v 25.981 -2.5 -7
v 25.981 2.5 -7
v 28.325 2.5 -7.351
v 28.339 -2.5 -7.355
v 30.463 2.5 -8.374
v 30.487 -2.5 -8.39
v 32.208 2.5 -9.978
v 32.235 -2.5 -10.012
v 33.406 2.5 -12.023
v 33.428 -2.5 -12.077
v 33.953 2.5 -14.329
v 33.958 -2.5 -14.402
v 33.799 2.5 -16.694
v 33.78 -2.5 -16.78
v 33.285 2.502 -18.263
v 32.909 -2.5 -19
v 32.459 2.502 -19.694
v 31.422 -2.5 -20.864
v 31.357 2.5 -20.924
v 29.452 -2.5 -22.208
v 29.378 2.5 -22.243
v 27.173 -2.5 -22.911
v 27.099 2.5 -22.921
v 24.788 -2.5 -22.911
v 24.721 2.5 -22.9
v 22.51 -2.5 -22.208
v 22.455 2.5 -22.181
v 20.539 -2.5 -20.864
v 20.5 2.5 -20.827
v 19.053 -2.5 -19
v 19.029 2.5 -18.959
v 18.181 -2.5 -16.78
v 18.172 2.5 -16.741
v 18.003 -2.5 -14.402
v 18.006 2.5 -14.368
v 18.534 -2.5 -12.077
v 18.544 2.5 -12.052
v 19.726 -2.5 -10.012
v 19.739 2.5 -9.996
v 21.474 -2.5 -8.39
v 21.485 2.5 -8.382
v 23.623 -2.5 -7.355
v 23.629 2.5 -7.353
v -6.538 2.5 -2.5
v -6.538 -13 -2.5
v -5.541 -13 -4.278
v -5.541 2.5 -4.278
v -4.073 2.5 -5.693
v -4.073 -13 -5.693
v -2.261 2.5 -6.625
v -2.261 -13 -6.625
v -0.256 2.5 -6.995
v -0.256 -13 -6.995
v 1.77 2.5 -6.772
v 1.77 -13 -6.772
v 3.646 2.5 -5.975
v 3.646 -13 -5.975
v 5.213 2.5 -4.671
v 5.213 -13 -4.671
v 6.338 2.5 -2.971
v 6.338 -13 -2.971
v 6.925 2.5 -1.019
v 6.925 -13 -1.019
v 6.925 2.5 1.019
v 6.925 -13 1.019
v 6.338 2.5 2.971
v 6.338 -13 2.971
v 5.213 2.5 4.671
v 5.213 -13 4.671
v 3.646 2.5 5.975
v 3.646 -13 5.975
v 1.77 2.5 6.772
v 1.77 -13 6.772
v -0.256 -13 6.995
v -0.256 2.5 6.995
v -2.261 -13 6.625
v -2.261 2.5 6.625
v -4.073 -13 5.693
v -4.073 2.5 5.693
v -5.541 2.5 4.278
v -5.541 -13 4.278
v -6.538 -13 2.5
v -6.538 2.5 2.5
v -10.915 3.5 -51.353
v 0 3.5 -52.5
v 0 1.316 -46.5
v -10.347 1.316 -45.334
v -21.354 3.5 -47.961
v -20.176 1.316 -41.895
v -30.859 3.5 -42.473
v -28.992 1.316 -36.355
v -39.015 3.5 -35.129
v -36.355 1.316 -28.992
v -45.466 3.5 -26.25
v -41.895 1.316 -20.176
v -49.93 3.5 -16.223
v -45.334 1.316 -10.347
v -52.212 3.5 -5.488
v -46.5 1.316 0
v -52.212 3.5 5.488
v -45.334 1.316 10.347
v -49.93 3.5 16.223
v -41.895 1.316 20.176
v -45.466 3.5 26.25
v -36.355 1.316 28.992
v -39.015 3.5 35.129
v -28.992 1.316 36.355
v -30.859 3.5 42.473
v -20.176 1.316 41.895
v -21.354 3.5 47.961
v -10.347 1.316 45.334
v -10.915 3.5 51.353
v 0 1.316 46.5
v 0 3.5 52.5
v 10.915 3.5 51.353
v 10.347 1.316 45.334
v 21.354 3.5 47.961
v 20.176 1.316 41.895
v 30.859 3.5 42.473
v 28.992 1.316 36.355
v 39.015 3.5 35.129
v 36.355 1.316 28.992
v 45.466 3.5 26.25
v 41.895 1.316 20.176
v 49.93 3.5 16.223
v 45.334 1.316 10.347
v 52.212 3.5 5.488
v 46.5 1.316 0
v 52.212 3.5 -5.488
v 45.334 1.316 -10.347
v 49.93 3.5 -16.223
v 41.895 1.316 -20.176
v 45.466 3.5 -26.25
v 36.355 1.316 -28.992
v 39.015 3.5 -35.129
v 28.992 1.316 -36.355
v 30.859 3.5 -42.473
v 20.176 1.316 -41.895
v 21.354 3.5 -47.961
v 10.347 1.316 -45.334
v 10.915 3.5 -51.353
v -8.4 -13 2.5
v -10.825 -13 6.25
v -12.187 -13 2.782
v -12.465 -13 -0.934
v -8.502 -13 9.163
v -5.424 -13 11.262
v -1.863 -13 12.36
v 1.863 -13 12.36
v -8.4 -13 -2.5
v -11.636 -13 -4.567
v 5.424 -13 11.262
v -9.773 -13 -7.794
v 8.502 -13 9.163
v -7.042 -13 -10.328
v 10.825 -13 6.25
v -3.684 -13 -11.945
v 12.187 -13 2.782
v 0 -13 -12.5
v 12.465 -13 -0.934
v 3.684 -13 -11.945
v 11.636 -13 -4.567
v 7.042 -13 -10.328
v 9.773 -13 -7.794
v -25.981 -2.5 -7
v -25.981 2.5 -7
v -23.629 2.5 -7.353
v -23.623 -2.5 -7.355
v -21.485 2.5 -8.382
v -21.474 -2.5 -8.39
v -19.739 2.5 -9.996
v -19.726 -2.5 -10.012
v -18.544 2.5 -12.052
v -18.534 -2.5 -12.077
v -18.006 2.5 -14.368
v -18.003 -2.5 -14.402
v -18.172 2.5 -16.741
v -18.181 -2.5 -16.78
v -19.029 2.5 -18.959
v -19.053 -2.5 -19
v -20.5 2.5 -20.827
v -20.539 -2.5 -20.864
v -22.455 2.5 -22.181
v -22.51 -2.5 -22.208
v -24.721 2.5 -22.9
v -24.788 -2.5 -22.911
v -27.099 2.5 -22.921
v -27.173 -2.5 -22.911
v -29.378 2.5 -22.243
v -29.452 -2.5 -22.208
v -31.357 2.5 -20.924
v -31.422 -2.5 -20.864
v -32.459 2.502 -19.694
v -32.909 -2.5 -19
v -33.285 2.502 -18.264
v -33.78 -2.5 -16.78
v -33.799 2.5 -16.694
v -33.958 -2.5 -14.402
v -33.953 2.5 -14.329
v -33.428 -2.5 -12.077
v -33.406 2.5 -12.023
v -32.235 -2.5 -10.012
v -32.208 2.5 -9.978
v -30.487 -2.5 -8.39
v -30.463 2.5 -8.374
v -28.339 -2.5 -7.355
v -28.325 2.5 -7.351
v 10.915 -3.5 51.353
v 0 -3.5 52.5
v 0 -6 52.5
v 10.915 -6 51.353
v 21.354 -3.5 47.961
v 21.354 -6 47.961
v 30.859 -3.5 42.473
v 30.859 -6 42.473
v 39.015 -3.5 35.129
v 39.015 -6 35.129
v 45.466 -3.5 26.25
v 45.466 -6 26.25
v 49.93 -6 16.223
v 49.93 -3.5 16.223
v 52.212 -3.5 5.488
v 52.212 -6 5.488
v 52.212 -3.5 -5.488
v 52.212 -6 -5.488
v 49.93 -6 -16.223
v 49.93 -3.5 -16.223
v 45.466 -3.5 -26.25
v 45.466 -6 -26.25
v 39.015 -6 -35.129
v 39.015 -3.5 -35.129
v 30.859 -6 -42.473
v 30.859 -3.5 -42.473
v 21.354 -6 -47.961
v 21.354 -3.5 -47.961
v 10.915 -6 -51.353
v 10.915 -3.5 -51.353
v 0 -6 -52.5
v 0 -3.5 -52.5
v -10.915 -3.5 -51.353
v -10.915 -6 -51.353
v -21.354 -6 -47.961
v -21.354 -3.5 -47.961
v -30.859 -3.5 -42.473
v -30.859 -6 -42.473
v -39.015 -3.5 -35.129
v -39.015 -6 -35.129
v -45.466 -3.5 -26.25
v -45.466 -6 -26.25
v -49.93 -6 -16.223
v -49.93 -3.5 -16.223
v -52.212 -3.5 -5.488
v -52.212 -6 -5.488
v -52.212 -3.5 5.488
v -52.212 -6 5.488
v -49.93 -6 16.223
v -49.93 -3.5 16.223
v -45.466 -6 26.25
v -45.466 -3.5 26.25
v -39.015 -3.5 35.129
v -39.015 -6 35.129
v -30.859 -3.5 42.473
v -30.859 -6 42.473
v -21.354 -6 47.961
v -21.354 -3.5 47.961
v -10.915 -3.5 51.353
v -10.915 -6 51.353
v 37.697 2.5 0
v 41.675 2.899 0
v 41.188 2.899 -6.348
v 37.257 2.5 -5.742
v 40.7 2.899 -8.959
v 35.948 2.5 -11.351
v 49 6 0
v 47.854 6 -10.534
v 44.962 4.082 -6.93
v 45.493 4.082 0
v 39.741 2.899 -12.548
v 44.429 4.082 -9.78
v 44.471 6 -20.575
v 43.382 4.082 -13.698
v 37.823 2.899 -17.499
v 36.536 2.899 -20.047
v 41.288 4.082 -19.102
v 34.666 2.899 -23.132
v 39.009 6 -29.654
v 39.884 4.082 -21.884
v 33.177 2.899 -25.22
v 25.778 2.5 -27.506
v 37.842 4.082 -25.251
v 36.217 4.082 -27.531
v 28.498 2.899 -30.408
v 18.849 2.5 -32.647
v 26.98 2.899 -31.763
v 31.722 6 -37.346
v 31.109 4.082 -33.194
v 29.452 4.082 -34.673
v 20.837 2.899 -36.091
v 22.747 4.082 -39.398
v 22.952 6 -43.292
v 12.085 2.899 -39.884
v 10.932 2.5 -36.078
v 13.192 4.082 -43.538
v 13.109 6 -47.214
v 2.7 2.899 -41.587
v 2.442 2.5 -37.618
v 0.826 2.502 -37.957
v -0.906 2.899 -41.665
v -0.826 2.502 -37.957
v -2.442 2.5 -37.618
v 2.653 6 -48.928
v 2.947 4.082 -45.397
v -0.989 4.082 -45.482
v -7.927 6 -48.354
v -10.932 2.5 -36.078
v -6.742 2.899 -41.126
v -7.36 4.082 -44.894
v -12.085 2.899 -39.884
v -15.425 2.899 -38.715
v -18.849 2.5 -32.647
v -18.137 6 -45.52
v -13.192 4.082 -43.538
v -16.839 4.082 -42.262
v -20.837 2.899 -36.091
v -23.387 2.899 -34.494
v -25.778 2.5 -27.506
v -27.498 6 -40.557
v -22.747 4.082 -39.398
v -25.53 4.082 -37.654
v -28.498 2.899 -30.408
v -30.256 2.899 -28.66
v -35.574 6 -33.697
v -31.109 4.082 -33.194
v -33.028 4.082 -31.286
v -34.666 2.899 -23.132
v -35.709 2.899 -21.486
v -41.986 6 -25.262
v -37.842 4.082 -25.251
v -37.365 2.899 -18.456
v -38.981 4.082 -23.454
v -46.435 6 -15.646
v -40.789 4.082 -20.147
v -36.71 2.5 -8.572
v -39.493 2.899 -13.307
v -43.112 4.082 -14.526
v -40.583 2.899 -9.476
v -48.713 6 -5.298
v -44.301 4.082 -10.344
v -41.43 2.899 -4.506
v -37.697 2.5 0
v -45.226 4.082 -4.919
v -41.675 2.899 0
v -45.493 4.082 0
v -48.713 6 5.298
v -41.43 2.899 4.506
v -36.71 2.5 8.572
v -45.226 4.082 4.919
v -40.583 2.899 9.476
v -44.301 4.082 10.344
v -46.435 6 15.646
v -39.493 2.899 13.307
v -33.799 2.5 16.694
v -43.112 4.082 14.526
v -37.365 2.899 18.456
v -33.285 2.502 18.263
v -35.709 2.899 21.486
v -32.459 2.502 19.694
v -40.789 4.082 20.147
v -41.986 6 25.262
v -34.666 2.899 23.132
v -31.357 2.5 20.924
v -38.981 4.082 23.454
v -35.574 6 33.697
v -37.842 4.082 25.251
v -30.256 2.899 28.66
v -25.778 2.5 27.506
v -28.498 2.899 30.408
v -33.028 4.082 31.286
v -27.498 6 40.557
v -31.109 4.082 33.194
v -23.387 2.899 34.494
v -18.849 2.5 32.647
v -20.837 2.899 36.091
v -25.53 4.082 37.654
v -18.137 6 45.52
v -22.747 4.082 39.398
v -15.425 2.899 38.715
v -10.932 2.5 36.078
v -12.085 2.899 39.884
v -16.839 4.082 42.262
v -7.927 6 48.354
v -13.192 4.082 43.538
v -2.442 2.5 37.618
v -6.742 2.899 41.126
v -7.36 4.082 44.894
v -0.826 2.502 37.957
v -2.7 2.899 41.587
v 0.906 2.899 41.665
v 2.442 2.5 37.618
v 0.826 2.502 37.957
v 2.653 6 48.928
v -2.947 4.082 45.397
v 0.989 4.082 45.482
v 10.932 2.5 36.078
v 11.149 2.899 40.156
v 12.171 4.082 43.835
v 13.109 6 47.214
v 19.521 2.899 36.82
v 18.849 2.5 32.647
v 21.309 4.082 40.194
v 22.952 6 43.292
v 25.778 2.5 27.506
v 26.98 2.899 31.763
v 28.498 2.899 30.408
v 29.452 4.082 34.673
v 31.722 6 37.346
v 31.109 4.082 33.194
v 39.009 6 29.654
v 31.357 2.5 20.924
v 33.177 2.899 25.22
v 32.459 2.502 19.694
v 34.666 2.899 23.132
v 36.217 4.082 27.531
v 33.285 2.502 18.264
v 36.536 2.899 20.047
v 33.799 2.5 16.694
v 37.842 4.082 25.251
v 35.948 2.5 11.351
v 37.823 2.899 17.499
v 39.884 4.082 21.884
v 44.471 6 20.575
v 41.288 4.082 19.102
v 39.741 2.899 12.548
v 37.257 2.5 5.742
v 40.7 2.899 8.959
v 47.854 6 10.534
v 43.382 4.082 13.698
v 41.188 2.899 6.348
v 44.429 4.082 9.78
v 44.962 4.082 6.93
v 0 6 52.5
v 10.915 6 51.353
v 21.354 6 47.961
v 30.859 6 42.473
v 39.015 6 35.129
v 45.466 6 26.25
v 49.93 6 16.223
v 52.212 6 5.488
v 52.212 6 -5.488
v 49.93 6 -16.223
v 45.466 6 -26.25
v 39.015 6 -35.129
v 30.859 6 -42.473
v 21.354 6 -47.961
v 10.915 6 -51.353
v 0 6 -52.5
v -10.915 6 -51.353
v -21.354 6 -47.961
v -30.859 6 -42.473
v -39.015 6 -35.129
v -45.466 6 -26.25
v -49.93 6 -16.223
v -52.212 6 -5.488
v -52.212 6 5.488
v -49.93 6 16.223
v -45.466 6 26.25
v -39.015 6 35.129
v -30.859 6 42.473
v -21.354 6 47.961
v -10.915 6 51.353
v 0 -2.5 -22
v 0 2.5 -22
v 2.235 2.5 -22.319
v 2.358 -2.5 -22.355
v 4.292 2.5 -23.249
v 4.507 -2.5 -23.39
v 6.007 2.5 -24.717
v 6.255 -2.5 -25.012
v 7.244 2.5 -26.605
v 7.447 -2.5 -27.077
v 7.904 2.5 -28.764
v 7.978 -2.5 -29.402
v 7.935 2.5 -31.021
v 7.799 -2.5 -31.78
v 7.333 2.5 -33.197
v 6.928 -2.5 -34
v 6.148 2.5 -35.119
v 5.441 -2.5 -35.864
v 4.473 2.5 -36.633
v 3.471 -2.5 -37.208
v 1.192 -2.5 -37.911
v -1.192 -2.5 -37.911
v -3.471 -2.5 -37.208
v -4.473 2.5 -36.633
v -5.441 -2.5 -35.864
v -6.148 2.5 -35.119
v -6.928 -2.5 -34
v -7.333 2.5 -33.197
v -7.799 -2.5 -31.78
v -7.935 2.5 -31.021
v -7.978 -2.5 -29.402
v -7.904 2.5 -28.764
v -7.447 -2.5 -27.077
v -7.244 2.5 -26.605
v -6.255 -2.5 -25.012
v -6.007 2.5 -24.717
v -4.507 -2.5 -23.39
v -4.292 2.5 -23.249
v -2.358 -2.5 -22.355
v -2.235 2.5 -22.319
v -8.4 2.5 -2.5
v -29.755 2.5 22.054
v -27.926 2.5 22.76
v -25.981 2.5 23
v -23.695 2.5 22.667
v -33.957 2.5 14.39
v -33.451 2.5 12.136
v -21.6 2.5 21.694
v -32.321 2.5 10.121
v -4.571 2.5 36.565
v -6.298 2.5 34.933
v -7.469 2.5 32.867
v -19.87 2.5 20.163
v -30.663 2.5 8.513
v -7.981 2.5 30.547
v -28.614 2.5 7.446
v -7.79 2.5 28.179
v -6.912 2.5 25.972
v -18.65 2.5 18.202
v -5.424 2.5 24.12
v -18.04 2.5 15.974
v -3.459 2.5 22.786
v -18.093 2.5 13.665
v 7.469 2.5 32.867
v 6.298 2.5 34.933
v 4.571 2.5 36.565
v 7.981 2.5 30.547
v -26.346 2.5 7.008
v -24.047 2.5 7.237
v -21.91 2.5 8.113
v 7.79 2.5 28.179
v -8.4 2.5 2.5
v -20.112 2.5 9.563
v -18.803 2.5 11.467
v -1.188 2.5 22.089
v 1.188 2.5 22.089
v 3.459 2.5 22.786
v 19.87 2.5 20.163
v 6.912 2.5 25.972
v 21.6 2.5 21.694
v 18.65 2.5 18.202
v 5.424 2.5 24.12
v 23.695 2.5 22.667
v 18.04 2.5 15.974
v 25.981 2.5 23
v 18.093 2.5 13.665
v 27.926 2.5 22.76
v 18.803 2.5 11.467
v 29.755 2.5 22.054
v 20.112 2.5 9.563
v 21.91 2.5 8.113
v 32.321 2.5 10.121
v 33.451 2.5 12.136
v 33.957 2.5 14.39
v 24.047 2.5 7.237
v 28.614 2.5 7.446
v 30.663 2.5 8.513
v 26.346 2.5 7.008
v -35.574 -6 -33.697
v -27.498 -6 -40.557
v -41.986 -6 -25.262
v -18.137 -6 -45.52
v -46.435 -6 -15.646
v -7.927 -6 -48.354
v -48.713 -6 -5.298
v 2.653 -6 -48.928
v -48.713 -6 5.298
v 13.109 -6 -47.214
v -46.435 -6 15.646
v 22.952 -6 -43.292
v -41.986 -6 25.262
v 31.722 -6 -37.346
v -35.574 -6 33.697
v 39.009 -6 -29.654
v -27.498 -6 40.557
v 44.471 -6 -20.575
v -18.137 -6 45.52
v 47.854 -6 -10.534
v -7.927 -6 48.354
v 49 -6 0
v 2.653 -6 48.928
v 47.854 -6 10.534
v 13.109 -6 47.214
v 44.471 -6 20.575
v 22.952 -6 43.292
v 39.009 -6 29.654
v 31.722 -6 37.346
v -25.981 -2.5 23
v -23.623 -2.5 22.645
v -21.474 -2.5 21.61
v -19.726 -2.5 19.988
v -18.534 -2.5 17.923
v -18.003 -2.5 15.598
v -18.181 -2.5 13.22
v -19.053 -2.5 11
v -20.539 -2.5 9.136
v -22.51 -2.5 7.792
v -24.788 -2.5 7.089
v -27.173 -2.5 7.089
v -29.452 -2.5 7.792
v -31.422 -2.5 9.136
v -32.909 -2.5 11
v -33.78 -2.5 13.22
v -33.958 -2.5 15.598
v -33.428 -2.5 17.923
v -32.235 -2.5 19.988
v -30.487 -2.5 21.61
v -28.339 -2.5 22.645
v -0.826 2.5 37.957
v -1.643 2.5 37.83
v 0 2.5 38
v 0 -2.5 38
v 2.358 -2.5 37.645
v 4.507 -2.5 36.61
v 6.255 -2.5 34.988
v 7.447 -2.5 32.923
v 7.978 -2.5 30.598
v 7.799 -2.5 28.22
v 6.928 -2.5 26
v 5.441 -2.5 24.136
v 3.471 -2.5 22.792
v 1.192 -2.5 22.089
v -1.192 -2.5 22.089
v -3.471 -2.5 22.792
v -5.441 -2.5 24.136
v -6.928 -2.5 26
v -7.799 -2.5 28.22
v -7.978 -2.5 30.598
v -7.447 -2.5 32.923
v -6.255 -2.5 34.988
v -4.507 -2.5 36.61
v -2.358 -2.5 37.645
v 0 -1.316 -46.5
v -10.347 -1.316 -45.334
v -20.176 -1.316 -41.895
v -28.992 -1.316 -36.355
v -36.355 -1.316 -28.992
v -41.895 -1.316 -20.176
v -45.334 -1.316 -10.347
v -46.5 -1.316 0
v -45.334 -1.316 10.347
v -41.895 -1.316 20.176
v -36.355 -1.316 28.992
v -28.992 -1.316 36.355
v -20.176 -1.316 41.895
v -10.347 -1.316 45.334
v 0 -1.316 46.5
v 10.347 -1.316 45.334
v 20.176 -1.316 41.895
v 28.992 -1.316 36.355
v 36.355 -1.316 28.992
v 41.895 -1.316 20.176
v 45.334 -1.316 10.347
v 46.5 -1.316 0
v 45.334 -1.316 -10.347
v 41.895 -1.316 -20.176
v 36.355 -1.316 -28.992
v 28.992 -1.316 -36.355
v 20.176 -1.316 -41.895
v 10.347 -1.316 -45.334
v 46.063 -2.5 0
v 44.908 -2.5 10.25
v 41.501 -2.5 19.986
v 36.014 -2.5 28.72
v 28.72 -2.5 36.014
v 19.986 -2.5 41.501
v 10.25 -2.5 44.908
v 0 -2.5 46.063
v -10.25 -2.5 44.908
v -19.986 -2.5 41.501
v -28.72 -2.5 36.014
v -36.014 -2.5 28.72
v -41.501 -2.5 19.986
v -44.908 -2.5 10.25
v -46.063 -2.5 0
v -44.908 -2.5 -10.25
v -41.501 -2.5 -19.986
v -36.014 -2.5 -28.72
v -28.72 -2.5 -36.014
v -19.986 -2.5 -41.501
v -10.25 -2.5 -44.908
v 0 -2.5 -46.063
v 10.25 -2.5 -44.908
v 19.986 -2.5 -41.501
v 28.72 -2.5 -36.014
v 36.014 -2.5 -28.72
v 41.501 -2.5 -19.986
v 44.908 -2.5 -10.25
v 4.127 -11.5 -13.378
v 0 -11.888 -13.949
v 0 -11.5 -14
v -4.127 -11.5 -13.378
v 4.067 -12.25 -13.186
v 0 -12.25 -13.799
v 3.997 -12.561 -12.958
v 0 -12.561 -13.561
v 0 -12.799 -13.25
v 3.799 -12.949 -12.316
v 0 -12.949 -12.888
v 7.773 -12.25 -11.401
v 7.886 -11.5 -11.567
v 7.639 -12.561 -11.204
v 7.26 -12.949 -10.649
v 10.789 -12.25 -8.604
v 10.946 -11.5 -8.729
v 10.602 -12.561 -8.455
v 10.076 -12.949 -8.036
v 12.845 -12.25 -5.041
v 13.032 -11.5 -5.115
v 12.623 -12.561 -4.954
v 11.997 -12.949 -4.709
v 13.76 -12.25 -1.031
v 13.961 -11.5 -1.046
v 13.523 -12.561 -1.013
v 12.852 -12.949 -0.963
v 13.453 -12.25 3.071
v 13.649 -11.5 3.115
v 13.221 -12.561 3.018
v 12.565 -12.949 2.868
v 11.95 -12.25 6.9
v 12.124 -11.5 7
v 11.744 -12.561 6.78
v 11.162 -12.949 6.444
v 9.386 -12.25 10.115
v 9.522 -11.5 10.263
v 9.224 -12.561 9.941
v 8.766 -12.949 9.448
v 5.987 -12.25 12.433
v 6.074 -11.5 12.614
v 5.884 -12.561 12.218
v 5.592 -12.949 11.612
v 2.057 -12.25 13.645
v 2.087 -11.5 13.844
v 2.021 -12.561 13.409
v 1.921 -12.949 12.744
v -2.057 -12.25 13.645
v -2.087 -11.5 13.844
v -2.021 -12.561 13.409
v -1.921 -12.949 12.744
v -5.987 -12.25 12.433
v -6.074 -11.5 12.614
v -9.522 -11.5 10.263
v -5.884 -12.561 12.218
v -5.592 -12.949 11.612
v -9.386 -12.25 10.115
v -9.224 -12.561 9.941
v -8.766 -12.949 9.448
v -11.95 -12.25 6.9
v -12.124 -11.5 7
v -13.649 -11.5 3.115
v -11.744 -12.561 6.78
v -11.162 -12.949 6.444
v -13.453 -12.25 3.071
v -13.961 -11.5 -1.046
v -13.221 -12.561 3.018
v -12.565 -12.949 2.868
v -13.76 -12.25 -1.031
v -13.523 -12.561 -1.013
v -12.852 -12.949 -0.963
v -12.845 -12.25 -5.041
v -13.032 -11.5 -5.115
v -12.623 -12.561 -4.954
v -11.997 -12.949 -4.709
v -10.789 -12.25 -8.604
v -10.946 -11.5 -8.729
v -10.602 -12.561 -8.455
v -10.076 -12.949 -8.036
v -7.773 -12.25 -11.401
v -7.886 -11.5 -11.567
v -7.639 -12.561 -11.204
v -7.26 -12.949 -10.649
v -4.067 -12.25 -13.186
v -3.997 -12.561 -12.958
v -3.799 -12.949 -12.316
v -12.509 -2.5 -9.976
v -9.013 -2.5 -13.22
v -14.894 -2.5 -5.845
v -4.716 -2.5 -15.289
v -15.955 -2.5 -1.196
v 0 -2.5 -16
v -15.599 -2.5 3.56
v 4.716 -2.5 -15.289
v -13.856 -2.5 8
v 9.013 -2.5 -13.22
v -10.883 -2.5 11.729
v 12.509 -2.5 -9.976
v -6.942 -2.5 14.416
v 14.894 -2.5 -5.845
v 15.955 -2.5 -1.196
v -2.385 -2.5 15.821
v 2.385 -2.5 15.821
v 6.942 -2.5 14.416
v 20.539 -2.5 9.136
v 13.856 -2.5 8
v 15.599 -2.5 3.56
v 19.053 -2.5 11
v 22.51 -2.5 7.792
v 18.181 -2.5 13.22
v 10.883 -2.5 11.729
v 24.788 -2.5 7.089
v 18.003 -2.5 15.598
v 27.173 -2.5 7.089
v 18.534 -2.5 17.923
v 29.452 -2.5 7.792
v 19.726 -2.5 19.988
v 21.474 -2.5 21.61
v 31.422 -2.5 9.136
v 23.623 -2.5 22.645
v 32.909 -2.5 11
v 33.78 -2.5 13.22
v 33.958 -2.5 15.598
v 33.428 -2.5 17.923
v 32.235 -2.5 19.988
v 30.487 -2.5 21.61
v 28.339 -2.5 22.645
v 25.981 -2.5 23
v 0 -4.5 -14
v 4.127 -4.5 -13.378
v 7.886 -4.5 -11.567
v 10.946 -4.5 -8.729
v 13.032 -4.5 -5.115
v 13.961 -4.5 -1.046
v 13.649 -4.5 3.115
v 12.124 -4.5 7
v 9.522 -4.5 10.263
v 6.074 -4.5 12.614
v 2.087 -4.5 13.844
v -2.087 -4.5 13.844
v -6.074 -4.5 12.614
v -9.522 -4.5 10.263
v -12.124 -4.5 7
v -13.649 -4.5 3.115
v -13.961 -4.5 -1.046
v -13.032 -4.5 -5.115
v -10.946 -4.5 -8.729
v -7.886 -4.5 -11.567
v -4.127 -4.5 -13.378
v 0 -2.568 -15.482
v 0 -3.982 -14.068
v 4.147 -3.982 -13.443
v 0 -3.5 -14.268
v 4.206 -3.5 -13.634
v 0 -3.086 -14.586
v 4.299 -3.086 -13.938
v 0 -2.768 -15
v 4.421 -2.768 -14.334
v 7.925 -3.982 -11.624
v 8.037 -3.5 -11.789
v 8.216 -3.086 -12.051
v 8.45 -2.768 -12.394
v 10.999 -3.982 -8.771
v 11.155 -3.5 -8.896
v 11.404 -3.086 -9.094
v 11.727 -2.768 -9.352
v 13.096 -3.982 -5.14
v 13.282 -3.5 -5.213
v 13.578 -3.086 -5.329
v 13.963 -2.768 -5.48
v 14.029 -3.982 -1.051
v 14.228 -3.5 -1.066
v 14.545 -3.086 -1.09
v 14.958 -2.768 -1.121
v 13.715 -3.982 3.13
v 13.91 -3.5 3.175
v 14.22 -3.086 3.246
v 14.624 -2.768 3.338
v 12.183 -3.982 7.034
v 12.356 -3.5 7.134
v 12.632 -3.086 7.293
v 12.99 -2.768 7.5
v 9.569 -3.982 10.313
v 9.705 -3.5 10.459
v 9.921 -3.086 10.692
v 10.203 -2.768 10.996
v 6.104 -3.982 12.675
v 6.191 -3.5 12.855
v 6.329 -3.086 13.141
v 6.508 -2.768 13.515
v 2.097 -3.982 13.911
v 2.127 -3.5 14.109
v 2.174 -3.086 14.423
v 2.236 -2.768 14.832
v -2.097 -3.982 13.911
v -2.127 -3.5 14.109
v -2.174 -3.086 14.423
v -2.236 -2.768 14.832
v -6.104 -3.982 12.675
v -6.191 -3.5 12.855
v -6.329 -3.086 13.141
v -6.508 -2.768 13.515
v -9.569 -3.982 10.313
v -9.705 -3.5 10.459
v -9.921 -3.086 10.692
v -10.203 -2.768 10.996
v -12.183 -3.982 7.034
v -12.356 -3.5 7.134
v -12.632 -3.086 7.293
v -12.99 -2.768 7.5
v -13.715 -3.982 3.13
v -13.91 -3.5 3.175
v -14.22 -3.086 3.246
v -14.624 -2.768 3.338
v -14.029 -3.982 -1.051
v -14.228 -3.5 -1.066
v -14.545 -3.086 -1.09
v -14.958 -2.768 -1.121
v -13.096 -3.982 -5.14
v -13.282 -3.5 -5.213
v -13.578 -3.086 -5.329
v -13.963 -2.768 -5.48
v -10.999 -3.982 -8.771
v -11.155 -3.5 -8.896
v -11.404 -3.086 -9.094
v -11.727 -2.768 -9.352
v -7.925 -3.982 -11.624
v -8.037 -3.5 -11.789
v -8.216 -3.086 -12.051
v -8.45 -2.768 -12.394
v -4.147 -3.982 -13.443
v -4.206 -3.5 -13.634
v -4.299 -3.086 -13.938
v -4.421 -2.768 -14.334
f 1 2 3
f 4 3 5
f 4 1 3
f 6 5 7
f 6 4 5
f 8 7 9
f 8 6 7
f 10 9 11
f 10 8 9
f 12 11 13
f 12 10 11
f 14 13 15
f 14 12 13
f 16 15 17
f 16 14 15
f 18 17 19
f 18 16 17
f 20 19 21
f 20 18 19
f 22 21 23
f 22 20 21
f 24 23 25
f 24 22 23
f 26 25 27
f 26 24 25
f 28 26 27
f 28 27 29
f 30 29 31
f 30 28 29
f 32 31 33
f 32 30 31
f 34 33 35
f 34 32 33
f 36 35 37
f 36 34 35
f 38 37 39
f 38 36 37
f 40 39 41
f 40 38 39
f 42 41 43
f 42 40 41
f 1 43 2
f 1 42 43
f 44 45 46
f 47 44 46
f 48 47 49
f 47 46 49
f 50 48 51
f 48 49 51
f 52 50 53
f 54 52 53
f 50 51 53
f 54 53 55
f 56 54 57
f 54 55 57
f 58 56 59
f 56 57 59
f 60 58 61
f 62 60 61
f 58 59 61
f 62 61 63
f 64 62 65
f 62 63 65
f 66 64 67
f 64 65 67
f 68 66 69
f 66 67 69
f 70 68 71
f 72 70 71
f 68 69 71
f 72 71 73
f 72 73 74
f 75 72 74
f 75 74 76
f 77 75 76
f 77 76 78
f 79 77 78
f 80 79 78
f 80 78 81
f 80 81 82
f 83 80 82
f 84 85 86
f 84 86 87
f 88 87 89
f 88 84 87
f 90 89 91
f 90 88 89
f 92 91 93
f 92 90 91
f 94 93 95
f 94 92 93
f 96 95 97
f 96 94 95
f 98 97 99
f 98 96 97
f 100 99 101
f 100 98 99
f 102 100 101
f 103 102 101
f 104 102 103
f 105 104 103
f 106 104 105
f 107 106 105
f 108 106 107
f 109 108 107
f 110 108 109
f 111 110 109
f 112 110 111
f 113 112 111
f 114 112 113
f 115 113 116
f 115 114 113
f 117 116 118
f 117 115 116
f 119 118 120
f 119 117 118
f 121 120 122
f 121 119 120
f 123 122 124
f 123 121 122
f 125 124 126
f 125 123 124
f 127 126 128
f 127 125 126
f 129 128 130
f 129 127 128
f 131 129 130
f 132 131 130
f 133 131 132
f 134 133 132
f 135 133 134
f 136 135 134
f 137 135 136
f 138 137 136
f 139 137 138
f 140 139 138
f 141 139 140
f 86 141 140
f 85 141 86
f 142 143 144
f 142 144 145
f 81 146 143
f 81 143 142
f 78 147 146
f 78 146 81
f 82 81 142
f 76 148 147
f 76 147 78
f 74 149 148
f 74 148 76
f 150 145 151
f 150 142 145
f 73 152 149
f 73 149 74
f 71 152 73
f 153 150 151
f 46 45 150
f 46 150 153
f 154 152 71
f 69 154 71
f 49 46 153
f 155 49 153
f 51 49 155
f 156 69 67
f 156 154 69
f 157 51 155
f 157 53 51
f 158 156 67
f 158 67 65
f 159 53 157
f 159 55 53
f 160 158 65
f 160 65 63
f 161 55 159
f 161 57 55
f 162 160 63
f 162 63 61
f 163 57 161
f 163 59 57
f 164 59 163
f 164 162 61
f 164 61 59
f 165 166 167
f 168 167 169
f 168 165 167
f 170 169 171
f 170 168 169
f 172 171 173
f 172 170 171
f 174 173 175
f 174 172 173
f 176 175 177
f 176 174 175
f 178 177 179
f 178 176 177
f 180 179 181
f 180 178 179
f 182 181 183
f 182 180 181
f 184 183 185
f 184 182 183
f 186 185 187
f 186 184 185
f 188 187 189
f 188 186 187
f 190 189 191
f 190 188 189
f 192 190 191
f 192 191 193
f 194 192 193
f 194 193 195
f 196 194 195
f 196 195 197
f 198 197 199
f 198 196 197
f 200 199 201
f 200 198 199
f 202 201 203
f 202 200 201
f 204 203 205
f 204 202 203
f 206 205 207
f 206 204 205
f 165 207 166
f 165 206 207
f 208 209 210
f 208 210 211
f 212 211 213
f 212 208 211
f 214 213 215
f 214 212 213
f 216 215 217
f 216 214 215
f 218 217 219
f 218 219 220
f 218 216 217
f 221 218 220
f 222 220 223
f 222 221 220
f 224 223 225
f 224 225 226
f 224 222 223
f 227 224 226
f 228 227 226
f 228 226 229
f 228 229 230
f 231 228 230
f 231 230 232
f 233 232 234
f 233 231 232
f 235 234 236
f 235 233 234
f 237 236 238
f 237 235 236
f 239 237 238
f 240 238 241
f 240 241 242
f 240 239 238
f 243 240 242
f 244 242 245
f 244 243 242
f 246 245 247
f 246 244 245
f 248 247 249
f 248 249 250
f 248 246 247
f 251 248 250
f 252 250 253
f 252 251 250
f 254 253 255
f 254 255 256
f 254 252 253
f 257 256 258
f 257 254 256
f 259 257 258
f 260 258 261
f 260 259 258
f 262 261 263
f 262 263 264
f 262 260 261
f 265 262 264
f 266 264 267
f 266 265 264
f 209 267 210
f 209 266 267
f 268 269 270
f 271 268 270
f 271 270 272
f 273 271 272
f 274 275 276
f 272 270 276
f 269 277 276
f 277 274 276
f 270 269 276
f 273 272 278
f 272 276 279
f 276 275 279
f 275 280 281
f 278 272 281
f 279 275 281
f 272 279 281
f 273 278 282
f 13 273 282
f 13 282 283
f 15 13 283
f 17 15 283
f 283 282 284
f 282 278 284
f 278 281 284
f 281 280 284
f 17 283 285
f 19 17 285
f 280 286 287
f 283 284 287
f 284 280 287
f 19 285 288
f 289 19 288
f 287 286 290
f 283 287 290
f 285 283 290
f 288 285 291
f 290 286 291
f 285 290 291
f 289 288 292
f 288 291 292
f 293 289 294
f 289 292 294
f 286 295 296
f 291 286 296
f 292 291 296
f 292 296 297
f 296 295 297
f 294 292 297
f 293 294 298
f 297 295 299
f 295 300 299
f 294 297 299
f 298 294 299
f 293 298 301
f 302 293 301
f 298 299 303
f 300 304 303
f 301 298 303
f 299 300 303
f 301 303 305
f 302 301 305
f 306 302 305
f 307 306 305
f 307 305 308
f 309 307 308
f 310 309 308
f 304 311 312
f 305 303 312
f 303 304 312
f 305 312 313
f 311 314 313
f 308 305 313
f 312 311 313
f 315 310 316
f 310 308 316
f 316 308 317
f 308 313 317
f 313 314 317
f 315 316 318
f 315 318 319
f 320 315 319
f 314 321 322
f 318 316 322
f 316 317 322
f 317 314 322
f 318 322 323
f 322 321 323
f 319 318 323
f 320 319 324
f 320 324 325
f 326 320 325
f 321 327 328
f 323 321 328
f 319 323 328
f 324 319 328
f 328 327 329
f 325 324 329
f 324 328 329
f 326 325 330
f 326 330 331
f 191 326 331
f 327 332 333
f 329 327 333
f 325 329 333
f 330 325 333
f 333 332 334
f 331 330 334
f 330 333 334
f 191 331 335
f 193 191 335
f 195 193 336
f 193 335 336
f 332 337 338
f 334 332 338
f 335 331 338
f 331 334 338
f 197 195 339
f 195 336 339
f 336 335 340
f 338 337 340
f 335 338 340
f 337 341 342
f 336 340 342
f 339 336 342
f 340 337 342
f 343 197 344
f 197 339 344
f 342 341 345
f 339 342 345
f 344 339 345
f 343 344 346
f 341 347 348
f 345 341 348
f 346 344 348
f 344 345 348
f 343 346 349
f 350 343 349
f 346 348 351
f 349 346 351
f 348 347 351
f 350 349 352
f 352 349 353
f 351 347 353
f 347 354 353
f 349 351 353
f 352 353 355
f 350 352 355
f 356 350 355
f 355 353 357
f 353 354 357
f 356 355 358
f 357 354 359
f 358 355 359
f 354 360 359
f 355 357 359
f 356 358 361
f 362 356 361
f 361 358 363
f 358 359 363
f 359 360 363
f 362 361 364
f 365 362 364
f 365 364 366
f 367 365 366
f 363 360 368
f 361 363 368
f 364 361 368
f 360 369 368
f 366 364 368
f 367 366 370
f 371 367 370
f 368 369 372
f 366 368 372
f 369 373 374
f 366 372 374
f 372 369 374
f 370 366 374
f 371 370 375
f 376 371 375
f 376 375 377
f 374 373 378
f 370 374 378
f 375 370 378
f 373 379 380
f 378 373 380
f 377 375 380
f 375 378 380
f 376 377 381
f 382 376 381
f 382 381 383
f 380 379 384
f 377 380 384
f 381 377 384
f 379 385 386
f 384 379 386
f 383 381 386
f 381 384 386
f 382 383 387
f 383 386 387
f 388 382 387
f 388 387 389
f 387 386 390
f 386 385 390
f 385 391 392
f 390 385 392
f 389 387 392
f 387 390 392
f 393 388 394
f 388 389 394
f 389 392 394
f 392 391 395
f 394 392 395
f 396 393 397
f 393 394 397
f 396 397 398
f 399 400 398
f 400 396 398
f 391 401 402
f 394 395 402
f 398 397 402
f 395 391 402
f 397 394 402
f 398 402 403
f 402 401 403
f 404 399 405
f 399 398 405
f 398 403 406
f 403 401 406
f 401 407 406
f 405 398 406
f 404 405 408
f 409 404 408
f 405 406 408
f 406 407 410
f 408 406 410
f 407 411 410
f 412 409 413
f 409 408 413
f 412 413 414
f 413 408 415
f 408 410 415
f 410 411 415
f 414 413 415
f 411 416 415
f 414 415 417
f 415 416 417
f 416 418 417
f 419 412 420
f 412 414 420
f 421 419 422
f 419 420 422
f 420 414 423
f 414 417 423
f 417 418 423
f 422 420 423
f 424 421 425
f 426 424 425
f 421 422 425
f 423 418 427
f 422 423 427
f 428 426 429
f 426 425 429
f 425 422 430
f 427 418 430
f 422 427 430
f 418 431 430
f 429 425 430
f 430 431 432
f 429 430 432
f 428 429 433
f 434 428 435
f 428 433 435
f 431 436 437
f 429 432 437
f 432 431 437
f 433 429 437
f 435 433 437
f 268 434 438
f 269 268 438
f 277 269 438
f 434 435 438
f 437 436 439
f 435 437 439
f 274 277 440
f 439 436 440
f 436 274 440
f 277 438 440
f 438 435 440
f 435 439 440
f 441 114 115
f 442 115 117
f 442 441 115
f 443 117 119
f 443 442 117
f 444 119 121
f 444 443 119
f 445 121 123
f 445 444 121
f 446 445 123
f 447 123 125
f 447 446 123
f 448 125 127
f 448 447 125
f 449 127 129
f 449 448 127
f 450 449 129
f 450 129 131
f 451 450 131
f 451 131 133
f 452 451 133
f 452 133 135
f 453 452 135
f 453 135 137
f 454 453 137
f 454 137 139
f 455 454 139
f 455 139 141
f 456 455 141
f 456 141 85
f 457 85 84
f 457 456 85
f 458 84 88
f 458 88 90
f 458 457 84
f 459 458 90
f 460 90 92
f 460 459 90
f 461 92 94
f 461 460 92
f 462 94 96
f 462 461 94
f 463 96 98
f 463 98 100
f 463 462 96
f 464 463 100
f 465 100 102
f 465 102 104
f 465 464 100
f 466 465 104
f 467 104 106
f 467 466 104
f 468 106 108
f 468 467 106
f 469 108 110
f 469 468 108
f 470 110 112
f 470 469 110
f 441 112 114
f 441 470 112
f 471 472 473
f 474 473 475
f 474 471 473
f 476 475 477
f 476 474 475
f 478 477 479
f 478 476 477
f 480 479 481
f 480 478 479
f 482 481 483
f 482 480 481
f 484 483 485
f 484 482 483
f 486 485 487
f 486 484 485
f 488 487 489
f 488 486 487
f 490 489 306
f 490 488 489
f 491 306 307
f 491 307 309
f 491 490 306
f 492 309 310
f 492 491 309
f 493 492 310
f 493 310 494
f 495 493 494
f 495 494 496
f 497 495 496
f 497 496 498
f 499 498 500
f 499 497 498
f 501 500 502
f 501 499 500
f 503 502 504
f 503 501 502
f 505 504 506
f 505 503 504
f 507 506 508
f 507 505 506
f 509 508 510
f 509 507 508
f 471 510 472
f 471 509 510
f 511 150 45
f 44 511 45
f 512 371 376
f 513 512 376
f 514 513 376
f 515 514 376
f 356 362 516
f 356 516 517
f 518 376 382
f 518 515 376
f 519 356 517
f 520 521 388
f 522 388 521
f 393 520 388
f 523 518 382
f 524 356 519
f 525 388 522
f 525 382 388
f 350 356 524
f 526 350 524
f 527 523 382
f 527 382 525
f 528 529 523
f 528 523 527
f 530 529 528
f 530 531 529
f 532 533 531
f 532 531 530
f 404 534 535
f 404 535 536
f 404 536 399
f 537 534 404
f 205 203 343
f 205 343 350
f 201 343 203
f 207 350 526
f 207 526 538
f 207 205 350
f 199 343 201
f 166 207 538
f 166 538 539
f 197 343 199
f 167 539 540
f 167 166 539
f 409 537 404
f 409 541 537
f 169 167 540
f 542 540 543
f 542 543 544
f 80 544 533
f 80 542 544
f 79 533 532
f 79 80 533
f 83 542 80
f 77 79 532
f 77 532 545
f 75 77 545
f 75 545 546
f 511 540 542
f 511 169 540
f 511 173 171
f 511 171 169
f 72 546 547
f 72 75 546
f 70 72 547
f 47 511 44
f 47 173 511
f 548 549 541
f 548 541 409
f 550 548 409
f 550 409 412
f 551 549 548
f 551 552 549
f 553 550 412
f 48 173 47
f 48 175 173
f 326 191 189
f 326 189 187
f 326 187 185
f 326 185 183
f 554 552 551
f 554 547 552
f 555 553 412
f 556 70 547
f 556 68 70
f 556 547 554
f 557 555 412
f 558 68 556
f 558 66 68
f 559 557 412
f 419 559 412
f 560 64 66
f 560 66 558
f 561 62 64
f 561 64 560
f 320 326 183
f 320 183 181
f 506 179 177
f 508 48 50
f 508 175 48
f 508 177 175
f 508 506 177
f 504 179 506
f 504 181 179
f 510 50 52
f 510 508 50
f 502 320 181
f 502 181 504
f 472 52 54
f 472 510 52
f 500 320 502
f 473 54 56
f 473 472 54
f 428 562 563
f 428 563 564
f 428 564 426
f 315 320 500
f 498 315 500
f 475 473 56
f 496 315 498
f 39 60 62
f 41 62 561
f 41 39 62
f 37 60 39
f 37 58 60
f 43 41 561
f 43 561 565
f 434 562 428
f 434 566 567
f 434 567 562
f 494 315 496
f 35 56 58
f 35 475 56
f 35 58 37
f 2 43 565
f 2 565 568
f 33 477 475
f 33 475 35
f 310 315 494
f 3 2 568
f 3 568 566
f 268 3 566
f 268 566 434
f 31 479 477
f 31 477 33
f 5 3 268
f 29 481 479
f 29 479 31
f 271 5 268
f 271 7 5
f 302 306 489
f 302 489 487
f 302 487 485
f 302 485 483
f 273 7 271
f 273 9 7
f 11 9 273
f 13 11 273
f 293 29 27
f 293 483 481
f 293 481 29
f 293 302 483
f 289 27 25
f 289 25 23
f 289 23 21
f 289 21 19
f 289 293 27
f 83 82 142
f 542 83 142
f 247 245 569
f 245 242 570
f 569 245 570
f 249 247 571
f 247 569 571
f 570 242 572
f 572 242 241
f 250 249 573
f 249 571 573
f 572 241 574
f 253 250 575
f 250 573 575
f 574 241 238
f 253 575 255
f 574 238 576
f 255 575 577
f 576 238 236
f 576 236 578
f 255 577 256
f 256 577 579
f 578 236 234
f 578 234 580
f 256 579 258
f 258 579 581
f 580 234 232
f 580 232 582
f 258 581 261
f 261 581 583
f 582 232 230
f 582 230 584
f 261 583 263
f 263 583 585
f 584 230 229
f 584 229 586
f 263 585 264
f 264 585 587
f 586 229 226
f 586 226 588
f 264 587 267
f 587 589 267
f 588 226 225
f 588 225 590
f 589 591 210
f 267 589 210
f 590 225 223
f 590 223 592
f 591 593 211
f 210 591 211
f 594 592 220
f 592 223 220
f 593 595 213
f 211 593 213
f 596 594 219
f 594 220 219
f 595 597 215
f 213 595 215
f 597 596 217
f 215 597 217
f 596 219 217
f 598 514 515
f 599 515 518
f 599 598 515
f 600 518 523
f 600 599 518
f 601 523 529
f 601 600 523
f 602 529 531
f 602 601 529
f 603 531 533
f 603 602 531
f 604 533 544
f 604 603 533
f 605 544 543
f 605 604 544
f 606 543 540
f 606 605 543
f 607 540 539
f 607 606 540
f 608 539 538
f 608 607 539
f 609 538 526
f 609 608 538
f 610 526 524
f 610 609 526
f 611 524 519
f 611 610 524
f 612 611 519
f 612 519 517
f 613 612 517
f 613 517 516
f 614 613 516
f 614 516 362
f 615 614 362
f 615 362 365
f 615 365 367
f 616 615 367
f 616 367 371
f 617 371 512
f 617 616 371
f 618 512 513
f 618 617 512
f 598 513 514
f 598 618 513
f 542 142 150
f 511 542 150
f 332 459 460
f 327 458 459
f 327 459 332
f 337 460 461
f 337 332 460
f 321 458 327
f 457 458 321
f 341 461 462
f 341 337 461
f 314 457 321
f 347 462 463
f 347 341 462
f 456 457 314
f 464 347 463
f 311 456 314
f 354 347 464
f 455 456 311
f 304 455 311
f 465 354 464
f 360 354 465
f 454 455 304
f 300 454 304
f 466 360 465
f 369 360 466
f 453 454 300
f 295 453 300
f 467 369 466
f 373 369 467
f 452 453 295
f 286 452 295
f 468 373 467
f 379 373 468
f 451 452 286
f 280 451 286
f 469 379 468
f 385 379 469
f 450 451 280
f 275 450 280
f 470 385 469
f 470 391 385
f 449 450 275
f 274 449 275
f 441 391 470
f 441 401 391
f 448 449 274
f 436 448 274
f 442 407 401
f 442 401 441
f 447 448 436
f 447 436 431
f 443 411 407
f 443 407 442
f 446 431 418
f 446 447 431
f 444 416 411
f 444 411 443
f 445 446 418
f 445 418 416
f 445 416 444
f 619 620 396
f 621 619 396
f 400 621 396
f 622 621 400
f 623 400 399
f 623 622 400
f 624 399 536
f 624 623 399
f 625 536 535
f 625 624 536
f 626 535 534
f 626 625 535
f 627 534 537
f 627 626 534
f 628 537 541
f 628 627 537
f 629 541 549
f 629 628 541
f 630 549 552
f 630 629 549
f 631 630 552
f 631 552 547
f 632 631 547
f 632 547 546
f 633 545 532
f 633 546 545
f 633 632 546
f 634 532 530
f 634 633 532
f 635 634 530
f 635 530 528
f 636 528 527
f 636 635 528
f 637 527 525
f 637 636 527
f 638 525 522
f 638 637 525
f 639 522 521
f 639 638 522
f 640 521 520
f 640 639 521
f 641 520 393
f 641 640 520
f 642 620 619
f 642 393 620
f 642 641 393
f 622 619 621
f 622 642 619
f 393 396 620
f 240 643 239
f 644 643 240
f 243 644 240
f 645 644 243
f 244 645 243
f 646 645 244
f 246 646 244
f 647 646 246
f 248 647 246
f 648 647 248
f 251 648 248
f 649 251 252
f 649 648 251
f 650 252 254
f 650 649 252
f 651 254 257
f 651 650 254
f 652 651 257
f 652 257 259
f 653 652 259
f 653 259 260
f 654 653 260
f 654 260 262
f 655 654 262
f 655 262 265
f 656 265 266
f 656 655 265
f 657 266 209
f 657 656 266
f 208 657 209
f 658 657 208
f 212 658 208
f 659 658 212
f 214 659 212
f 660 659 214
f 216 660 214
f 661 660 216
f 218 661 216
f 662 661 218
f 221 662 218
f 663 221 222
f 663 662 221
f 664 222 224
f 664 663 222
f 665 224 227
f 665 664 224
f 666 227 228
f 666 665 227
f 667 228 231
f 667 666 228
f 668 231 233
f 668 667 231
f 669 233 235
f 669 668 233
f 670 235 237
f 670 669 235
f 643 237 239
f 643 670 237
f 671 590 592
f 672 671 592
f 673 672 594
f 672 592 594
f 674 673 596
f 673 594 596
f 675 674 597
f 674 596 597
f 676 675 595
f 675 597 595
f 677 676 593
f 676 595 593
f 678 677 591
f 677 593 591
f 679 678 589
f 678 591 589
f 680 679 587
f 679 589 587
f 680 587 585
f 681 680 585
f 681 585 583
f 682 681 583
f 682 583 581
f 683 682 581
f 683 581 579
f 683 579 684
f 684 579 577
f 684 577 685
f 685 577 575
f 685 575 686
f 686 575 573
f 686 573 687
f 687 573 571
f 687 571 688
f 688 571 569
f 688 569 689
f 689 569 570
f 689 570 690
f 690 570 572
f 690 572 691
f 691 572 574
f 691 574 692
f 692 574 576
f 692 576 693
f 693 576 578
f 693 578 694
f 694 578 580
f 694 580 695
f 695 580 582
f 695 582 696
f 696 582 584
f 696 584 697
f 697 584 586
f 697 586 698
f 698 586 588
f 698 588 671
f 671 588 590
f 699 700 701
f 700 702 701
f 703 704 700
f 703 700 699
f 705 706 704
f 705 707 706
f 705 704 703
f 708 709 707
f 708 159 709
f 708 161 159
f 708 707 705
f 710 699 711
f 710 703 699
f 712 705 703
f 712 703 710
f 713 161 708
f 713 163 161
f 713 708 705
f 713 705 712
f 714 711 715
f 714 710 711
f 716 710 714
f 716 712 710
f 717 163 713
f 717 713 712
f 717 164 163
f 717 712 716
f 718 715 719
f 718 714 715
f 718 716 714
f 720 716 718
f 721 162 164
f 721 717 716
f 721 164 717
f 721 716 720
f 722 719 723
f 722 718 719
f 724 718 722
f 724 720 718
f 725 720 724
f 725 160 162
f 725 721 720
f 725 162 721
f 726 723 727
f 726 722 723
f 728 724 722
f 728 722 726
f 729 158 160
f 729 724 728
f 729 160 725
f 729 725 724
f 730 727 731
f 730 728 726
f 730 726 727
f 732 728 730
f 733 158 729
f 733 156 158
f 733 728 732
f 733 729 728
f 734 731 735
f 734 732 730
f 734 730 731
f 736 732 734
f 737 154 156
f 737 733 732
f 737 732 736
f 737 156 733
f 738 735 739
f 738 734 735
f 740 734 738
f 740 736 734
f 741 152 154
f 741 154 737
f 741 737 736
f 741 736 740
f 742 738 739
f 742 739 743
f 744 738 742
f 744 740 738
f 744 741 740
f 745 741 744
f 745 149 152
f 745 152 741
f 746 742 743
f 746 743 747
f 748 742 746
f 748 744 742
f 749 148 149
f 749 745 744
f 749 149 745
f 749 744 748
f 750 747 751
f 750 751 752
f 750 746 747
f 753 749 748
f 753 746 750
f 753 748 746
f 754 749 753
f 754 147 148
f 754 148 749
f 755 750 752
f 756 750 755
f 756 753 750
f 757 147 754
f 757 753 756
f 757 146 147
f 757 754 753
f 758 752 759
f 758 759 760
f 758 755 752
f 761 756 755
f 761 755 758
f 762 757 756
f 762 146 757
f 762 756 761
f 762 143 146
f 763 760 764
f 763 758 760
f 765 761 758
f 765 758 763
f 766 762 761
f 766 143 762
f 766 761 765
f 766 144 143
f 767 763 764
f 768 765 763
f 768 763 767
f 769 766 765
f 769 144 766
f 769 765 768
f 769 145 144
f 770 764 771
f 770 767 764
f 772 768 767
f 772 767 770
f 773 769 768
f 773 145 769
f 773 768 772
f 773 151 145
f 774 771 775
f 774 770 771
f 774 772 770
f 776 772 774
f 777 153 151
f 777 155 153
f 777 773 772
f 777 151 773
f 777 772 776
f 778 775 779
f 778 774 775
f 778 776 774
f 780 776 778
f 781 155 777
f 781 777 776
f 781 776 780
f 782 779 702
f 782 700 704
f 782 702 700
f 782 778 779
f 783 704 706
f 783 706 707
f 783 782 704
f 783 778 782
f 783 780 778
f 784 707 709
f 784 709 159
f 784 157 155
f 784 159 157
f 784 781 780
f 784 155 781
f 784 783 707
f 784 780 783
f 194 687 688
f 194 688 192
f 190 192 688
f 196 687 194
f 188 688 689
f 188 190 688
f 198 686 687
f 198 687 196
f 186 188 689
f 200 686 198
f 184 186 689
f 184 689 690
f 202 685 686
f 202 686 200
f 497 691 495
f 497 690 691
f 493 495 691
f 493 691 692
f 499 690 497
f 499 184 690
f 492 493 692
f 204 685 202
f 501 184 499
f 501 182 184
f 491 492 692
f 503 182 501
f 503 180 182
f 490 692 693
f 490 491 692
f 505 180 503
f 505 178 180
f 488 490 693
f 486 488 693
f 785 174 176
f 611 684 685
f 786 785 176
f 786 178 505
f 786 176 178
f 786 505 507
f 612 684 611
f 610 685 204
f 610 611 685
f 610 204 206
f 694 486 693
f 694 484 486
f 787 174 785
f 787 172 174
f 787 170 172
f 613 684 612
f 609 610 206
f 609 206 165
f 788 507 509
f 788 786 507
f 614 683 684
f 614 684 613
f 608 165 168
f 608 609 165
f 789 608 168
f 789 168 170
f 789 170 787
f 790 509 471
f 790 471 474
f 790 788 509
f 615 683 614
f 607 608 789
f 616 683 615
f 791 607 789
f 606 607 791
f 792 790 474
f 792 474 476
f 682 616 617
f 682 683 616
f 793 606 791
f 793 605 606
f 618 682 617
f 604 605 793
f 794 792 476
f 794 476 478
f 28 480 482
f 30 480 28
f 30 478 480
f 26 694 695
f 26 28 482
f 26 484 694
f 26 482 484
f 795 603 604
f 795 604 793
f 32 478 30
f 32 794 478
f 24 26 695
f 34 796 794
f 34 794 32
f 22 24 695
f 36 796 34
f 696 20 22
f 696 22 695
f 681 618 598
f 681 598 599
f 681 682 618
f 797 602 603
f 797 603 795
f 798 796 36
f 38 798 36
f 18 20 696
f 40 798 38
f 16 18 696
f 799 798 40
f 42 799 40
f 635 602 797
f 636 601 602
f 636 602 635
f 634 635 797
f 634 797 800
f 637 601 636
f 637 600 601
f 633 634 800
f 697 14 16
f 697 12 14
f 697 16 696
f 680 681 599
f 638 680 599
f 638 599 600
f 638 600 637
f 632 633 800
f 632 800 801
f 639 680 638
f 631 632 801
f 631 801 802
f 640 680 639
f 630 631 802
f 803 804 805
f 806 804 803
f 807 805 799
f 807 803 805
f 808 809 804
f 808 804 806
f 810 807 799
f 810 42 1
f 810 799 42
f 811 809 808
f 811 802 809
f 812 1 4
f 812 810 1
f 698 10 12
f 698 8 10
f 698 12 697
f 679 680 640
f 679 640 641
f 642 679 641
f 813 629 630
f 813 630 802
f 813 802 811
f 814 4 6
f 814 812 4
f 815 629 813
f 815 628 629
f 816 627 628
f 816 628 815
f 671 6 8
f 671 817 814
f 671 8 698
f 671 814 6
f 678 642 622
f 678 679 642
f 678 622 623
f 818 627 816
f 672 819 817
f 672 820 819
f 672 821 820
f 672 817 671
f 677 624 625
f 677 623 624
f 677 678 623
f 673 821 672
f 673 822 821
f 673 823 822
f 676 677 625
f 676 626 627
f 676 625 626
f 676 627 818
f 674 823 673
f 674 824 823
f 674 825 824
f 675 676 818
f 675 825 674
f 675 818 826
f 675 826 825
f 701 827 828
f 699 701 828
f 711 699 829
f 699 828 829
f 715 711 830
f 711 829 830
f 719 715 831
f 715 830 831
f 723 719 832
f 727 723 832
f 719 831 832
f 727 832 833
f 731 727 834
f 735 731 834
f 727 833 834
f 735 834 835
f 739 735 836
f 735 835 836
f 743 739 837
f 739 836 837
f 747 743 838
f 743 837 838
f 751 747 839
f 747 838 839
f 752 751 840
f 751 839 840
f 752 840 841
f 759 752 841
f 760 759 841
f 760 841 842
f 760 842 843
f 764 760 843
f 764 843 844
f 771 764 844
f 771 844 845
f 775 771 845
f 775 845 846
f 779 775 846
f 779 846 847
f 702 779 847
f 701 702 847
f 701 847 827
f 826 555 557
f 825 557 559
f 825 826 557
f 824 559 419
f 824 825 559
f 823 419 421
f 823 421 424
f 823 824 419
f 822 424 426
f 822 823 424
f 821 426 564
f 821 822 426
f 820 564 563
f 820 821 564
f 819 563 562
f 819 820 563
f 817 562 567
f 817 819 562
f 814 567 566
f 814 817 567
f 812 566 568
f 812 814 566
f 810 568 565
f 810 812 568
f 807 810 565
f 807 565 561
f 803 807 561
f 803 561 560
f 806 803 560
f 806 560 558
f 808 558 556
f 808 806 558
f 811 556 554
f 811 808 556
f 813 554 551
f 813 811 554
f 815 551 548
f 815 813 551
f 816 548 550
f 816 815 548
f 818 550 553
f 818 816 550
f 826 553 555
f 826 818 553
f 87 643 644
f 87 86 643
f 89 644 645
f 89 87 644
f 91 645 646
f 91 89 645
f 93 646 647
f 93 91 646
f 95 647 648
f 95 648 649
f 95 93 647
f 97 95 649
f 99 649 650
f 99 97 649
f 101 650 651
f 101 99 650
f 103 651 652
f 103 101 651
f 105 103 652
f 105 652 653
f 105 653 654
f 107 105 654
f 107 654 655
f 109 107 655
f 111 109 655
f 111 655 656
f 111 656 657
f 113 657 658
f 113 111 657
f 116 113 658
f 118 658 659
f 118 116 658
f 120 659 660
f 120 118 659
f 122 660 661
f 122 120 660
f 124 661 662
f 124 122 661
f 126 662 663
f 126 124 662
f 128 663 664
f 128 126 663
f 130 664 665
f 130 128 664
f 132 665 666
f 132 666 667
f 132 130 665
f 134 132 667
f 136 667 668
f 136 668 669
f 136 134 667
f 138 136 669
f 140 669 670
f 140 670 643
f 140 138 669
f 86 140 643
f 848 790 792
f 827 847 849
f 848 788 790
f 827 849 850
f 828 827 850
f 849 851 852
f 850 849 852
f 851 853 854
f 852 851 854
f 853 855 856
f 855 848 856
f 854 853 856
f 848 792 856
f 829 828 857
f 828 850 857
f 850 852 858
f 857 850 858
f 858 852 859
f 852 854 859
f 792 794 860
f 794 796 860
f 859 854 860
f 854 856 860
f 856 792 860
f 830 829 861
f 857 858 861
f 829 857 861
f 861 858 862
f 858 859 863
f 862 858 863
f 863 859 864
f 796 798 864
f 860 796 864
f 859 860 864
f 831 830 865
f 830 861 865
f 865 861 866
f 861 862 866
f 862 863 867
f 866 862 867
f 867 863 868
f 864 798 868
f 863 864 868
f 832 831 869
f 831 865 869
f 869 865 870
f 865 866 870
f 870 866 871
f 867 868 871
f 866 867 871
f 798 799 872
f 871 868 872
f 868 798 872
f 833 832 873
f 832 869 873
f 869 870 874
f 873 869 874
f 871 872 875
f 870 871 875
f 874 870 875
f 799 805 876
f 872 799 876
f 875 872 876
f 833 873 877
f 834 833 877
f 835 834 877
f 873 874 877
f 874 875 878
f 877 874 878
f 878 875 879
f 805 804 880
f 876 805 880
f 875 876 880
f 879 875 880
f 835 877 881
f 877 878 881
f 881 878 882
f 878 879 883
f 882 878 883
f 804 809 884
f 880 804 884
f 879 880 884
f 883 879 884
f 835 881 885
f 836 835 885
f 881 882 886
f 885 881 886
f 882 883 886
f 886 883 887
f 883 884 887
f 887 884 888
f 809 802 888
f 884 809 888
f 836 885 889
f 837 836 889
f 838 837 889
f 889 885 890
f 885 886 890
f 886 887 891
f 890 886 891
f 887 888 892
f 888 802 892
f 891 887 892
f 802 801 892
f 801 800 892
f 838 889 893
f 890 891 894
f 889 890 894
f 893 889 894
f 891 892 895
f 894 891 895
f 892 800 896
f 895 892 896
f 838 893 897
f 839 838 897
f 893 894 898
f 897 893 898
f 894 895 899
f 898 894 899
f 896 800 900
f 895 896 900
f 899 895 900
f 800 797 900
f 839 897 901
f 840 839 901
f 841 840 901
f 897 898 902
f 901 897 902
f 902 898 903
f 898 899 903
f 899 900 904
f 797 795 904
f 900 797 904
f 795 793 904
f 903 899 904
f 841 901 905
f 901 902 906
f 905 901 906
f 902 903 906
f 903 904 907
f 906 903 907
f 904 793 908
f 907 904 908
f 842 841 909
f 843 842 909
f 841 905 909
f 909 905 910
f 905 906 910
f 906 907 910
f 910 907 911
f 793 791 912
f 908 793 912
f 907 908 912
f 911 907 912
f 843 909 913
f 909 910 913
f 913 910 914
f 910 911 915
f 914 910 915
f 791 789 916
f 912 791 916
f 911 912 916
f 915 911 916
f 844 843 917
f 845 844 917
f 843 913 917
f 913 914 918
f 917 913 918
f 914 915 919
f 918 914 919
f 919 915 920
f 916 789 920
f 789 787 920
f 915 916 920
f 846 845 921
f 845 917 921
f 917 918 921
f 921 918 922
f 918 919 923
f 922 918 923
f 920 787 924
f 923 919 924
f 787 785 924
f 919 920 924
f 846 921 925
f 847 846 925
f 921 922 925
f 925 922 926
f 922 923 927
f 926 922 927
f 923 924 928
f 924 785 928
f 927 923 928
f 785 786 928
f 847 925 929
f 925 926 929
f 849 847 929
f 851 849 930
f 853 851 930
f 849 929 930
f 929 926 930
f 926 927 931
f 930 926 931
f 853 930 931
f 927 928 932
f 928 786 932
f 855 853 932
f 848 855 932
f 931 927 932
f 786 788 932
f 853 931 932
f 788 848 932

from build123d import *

# Parameters (mm, degrees)
SKETCH1_R               = 52.5
SKETCH1_R_2             = 8
BOSS_EXTRUDE1_DEPTH     = 6
SKETCH2_R               = 14
BOSS_EXTRUDE2_DEPTH     = 7
CUT_EXTRUDE1_DEPTH      = 77
SKETCH4_R               = 49
CUT_EXTRUDE2_DEPTH      = 3.5
CUT_EXTRUDE2_DRAFT      = -40
FILLET1_R               = 20
MIRROR1_COPY_1_SKETCH_R = 49
MIRROR1_COPY_1_DEPTH    = 3.5
MIRROR1_COPY_1_DRAFT    = -40
SKETCH6_R               = 14
BOSS_EXTRUDE3_DEPTH     = 10.5
FILLET2_R               = 1.5
FILLET3_R               = 2


with BuildPart() as part:
    # Sketch1 → Boss-Extrude1 (new, symmetric)
    with BuildSketch(Plane(origin=(0, 0, 0), x_dir=(1, 0, 0), z_dir=(0, 1, 0))):
        with Locations(Location((0, 0, 0), (0, 0, 270))):
            Circle(SKETCH1_R)
        with Locations(Location((0, 30, 0), (0, 0, 270))):
            Circle(SKETCH1_R_2, mode=Mode.SUBTRACT)
        with Locations(Location((25.980762114, 15, 0), (0, 0, 270))):
            Circle(SKETCH1_R_2, mode=Mode.SUBTRACT)
        with Locations(Location((25.980762114, -15, 0), (0, 0, 270))):
            Circle(SKETCH1_R_2, mode=Mode.SUBTRACT)
        with Locations(Location((0, -30, 0), (0, 0, 270))):
            Circle(SKETCH1_R_2, mode=Mode.SUBTRACT)
        with Locations(Location((-25.980762114, -15, 0), (0, 0, 270))):
            Circle(SKETCH1_R_2, mode=Mode.SUBTRACT)
        with Locations(Location((-25.980762114, 15, 0), (0, 0, 270))):
            Circle(SKETCH1_R_2, mode=Mode.SUBTRACT)
    extrude(amount=BOSS_EXTRUDE1_DEPTH, both=True)

    # Sketch2 → Boss-Extrude2 (add)
    with BuildSketch(Plane.XZ.offset(6)):
        with Locations(Location((0, 0, 0), (0, 0, 270))):
            Circle(SKETCH2_R)
    extrude(amount=BOSS_EXTRUDE2_DEPTH)

    # Sketch3 → Cut-Extrude1 (cut)
    with BuildSketch(Plane.XZ.offset(13)):
        with BuildLine():
            Line((-8.4, 2.5), (-8.4, -2.5))
            Line((-8.4, -2.5), (-6.538348415, -2.5))
            ThreePointArc((-6.538348415, -2.5), (7, 0), (-6.538348415, 2.5))
            Line((-6.538348415, 2.5), (-8.4, 2.5))
        make_face()
    extrude(amount=-CUT_EXTRUDE1_DEPTH, mode=Mode.SUBTRACT)


with BuildPart() as cut_extrude2_tool:
    # Sketch4 → Cut-Extrude2 (with draft: the straight prism first)
    with BuildSketch(Plane(origin=(0, 6, 0), x_dir=(1, 0, 0), z_dir=(0, 1, 0))):
        Circle(SKETCH4_R)
    extrude(amount=-CUT_EXTRUDE2_DEPTH)
    # Cut-Extrude2: the draft: its side faces are tilted about the plane it starts from
    cut_extrude2_sides = [cut_extrude2_tool.faces().sort_by_distance(p)[0] for p in [
        (-49, 4.25, 0),
    ]]
    draft(cut_extrude2_sides, Plane(origin=(0, 6, 0), x_dir=(1, 0, 0), z_dir=(0, 1, 0)), CUT_EXTRUDE2_DRAFT)


with BuildPart() as part_1:
    add(part.part)

    # Cut-Extrude2: cut by cut_extrude2_tool
    add(cut_extrude2_tool.part, mode=Mode.SUBTRACT)

    # Fillet1
    # the kernel refuses this fillet: 20 mm, written as the material it adds along each edge
    with BuildSketch(Plane(origin=(0, 2.5, 0), x_dir=(1, 0, 0), z_dir=(0, 0, 1))) as fillet1_piece_1_section:
        with BuildLine():
            CenterArc((37.697345445, 20), FILLET1_R, 270, 34.41150867)
            Line((37.697345445, 0), (37.697345445, -0.4))
            Line((37.697345445, -0.4), (46.063151291, -0.4))
            Line((46.063151291, -0.4), (46.369569068, -0.257115044))
            ThreePointArc((46.369569068, -0.257115044), (47.837993423, 1.492884956), (49.226053091, 3.17))
            Line((49.226053091, 3.17), (49, 3.5))
        make_face()
    fillet1_piece_1 = revolve(axis=Axis((0, 2.5, 0), (0, 1, 0)), mode=Mode.PRIVATE)
    fillet1_piece_1 = fillet1_piece_1 - Plane(origin=(-25.980762114, 3.249062711, 15), x_dir=(0, 0, 1), z_dir=(0, -1, 0)) * Cylinder(8, 197, mode=Mode.PRIVATE)
    fillet1_piece_1 = fillet1_piece_1 - Plane(origin=(0, 3.249062711, 30), x_dir=(0, 0, 1), z_dir=(0, -1, 0)) * Cylinder(8, 197, mode=Mode.PRIVATE)
    fillet1_piece_1 = fillet1_piece_1 - Plane(origin=(25.980762114, 3.249062711, 15), x_dir=(0, 0, 1), z_dir=(0, -1, 0)) * Cylinder(8, 197, mode=Mode.PRIVATE)
    fillet1_piece_1 = fillet1_piece_1 - Plane(origin=(-25.980762114, 3.249062711, -15), x_dir=(0, 0, 1), z_dir=(0, -1, 0)) * Cylinder(8, 197, mode=Mode.PRIVATE)
    fillet1_piece_1 = fillet1_piece_1 - Plane(origin=(0, 3.249062711, -30), x_dir=(0, 0, 1), z_dir=(0, -1, 0)) * Cylinder(8, 197, mode=Mode.PRIVATE)
    fillet1_piece_1 = fillet1_piece_1 - Plane(origin=(25.980762114, 3.249062711, -15), x_dir=(0, 0, 1), z_dir=(0, -1, 0)) * Cylinder(8, 197, mode=Mode.PRIVATE)
    add(fillet1_piece_1)


with BuildPart() as mirror1_copy_1_tool:
    # Mirror1 copy 1 sketch → Mirror1 copy 1 (with draft: the straight prism first)
    with BuildSketch(Plane.XZ.offset(6)):
        Circle(MIRROR1_COPY_1_SKETCH_R)
    extrude(amount=-MIRROR1_COPY_1_DEPTH)
    # Mirror1 copy 1: the draft: its side faces are tilted about the plane it starts from
    mirror1_copy_1_sides = [mirror1_copy_1_tool.faces().sort_by_distance(p)[0] for p in [
        (-49, -4.25, 0),
    ]]
    draft(mirror1_copy_1_sides, Plane.XZ.offset(6), MIRROR1_COPY_1_DRAFT)


with BuildPart() as part_2:
    add(part_1.part)

    # Mirror1 copy 1: cut by mirror1_copy_1_tool
    add(mirror1_copy_1_tool.part, mode=Mode.SUBTRACT)

    # Sketch5 → Cut-Revolve1 (revolve, cut)
    with BuildSketch(Plane.XY, mode=Mode.PRIVATE) as cut_revolve1_sk:
        Polygon((52.5, 3.5), (52.5, -3.5), (46.5, -1.316178594), (46.5, 1.316178594), align=None)
    revolve(cut_revolve1_sk.sketch.rotate(Axis((0, 0, 0), (0, 1, 0)), 90), axis=Axis((0, 0, 0), (0, 1, 0)), mode=Mode.SUBTRACT)

    # Sketch6 → Boss-Extrude3 (add)
    with BuildSketch(Plane.XZ.offset(13)):
        with Locations(Location((0, 0, 0), (0, 0, 270))):
            Circle(SKETCH6_R)
        with BuildLine():
            Line((-8.4, 2.5), (-8.4, -2.5))
            Line((-8.4, -2.5), (-6.538348415, -2.5))
            ThreePointArc((-6.538348415, -2.5), (7, 0), (-6.538348415, 2.5))
            Line((-6.538348415, 2.5), (-8.4, 2.5))
        make_face(mode=Mode.SUBTRACT)
    extrude(amount=-BOSS_EXTRUDE3_DEPTH)

    # Fillet2
    fillet2_edges = [part_2.edges().sort_by_distance(p)[0] for p in [
        (0, -13, 14),
    ]]
    fillet(fillet2_edges, radius=FILLET2_R)

    # Fillet3
    fillet3_edges = [part_2.edges().sort_by_distance(p)[0] for p in [
        (0, -2.5, 14),
    ]]
    fillet(fillet3_edges, radius=FILLET3_R)


solid = part_2.part
